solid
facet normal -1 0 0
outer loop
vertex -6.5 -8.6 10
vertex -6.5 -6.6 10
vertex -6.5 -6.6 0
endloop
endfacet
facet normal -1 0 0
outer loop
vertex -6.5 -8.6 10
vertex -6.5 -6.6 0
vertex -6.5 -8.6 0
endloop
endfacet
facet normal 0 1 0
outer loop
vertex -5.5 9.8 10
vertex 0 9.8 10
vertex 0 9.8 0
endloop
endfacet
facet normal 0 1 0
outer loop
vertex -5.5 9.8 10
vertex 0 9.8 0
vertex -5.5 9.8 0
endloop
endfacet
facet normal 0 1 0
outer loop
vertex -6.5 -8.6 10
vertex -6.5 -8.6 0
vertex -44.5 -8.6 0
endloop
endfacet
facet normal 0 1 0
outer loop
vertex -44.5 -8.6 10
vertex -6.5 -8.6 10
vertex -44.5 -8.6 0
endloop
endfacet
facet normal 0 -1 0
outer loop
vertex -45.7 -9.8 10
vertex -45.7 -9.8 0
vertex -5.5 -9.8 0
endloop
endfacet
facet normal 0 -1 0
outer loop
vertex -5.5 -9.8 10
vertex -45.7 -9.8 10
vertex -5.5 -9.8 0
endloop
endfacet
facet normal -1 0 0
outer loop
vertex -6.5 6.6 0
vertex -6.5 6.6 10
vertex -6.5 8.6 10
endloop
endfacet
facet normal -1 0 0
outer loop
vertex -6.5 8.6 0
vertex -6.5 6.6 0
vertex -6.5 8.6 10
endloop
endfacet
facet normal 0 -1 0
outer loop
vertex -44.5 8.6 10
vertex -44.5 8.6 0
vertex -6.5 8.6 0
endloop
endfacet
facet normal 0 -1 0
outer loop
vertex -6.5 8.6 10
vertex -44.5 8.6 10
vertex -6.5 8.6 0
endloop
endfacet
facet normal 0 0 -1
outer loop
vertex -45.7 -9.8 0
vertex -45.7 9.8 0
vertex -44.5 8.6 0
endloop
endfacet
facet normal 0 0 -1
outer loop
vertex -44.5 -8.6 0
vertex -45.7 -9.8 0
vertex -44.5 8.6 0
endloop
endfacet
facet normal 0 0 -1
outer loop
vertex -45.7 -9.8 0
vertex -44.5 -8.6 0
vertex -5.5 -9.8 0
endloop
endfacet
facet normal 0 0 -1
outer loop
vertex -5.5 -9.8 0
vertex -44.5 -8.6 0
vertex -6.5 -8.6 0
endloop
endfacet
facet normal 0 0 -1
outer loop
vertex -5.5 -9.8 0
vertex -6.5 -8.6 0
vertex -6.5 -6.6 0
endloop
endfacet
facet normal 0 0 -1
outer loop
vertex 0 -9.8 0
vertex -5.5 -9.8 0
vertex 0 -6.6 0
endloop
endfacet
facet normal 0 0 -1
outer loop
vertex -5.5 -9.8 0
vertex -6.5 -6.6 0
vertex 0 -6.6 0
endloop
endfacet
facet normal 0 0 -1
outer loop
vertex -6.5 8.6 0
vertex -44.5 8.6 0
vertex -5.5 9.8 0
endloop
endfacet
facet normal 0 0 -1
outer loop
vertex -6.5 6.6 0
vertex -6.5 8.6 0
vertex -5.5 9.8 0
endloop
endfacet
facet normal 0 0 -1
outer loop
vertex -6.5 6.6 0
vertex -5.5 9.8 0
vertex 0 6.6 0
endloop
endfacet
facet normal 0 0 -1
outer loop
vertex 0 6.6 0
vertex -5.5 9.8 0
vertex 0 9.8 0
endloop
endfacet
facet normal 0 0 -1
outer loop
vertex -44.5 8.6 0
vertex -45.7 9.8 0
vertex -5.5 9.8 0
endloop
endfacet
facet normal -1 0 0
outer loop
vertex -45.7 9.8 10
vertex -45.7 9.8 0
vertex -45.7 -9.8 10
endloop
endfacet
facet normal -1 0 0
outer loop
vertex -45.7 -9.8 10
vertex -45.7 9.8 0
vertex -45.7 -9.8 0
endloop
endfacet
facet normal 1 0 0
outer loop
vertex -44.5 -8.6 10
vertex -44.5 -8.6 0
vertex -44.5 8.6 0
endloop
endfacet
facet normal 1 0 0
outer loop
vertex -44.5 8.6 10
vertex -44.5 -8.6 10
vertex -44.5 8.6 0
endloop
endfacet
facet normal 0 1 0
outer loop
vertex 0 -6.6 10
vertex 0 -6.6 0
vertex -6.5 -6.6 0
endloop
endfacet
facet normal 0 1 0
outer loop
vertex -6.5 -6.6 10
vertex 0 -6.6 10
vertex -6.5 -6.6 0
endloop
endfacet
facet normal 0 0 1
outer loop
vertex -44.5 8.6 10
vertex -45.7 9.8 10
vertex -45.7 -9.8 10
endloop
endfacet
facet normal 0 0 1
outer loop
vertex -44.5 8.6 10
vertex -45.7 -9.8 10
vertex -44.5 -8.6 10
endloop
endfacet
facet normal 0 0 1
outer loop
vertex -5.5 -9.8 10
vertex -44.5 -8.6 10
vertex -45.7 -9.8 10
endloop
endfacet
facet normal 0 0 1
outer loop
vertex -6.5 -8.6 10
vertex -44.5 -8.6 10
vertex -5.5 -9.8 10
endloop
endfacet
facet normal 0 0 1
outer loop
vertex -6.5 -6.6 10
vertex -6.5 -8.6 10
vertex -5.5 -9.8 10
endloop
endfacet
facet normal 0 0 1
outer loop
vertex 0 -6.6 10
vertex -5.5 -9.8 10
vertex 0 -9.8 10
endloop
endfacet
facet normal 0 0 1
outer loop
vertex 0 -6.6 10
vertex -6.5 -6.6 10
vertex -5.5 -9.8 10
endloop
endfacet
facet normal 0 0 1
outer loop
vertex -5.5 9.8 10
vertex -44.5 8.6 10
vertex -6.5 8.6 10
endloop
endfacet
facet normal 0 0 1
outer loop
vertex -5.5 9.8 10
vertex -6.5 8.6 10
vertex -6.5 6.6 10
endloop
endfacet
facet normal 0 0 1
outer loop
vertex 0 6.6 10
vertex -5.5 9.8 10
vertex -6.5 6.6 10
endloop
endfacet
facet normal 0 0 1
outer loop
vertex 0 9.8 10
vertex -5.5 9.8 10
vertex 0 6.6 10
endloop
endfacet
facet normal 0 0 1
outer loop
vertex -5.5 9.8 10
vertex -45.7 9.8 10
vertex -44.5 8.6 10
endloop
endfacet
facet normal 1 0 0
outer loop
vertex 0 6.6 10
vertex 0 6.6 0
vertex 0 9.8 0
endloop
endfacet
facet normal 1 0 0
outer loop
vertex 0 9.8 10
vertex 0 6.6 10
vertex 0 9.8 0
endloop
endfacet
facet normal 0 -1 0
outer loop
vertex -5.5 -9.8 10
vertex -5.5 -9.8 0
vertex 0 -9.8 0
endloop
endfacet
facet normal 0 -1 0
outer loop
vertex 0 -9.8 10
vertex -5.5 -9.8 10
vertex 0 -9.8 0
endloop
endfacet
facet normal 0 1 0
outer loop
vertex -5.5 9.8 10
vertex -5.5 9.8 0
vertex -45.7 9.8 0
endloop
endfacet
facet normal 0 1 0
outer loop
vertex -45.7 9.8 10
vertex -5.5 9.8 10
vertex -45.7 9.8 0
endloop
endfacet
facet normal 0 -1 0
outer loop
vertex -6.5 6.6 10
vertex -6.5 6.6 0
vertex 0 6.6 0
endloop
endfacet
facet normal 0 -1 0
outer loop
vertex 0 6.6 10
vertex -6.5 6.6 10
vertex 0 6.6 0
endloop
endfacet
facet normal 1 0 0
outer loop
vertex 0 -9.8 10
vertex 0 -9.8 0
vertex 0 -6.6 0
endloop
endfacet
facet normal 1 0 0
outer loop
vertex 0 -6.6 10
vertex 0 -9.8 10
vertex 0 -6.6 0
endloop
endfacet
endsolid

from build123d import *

# Parameters (mm, degrees)
F0_W     = 6.5
F0_H     = 2
F1_DEPTH = 10


# Not quite as in the source:
# - ends of sketch curves that miss each other by under 0.0002 mm in the source are joined


with BuildPart() as f1:
    # F0 (on Top) → F1 (new body)
    with BuildSketch(Plane.XY):
        Polygon((-44.5, -8.6), (-44.5, 0), (-44.5, 8.6), (-6.5, 8.6), (0, 8.6), (0, 9.8000001162), (-5.5, 9.8000001162), (-45.7, 9.8), (-45.7, 0), (-45.7, -9.8), (-5.5, -9.8), (0, -9.8000001162), (0, -8.6), (0, -6.6), (-6.5, -6.6), (-6.5, -8.6), align=None)
        with Locations((-3.25, 7.6)):
            Rectangle(F0_W, F0_H)
    extrude(amount=F1_DEPTH)


solid = f1.part
